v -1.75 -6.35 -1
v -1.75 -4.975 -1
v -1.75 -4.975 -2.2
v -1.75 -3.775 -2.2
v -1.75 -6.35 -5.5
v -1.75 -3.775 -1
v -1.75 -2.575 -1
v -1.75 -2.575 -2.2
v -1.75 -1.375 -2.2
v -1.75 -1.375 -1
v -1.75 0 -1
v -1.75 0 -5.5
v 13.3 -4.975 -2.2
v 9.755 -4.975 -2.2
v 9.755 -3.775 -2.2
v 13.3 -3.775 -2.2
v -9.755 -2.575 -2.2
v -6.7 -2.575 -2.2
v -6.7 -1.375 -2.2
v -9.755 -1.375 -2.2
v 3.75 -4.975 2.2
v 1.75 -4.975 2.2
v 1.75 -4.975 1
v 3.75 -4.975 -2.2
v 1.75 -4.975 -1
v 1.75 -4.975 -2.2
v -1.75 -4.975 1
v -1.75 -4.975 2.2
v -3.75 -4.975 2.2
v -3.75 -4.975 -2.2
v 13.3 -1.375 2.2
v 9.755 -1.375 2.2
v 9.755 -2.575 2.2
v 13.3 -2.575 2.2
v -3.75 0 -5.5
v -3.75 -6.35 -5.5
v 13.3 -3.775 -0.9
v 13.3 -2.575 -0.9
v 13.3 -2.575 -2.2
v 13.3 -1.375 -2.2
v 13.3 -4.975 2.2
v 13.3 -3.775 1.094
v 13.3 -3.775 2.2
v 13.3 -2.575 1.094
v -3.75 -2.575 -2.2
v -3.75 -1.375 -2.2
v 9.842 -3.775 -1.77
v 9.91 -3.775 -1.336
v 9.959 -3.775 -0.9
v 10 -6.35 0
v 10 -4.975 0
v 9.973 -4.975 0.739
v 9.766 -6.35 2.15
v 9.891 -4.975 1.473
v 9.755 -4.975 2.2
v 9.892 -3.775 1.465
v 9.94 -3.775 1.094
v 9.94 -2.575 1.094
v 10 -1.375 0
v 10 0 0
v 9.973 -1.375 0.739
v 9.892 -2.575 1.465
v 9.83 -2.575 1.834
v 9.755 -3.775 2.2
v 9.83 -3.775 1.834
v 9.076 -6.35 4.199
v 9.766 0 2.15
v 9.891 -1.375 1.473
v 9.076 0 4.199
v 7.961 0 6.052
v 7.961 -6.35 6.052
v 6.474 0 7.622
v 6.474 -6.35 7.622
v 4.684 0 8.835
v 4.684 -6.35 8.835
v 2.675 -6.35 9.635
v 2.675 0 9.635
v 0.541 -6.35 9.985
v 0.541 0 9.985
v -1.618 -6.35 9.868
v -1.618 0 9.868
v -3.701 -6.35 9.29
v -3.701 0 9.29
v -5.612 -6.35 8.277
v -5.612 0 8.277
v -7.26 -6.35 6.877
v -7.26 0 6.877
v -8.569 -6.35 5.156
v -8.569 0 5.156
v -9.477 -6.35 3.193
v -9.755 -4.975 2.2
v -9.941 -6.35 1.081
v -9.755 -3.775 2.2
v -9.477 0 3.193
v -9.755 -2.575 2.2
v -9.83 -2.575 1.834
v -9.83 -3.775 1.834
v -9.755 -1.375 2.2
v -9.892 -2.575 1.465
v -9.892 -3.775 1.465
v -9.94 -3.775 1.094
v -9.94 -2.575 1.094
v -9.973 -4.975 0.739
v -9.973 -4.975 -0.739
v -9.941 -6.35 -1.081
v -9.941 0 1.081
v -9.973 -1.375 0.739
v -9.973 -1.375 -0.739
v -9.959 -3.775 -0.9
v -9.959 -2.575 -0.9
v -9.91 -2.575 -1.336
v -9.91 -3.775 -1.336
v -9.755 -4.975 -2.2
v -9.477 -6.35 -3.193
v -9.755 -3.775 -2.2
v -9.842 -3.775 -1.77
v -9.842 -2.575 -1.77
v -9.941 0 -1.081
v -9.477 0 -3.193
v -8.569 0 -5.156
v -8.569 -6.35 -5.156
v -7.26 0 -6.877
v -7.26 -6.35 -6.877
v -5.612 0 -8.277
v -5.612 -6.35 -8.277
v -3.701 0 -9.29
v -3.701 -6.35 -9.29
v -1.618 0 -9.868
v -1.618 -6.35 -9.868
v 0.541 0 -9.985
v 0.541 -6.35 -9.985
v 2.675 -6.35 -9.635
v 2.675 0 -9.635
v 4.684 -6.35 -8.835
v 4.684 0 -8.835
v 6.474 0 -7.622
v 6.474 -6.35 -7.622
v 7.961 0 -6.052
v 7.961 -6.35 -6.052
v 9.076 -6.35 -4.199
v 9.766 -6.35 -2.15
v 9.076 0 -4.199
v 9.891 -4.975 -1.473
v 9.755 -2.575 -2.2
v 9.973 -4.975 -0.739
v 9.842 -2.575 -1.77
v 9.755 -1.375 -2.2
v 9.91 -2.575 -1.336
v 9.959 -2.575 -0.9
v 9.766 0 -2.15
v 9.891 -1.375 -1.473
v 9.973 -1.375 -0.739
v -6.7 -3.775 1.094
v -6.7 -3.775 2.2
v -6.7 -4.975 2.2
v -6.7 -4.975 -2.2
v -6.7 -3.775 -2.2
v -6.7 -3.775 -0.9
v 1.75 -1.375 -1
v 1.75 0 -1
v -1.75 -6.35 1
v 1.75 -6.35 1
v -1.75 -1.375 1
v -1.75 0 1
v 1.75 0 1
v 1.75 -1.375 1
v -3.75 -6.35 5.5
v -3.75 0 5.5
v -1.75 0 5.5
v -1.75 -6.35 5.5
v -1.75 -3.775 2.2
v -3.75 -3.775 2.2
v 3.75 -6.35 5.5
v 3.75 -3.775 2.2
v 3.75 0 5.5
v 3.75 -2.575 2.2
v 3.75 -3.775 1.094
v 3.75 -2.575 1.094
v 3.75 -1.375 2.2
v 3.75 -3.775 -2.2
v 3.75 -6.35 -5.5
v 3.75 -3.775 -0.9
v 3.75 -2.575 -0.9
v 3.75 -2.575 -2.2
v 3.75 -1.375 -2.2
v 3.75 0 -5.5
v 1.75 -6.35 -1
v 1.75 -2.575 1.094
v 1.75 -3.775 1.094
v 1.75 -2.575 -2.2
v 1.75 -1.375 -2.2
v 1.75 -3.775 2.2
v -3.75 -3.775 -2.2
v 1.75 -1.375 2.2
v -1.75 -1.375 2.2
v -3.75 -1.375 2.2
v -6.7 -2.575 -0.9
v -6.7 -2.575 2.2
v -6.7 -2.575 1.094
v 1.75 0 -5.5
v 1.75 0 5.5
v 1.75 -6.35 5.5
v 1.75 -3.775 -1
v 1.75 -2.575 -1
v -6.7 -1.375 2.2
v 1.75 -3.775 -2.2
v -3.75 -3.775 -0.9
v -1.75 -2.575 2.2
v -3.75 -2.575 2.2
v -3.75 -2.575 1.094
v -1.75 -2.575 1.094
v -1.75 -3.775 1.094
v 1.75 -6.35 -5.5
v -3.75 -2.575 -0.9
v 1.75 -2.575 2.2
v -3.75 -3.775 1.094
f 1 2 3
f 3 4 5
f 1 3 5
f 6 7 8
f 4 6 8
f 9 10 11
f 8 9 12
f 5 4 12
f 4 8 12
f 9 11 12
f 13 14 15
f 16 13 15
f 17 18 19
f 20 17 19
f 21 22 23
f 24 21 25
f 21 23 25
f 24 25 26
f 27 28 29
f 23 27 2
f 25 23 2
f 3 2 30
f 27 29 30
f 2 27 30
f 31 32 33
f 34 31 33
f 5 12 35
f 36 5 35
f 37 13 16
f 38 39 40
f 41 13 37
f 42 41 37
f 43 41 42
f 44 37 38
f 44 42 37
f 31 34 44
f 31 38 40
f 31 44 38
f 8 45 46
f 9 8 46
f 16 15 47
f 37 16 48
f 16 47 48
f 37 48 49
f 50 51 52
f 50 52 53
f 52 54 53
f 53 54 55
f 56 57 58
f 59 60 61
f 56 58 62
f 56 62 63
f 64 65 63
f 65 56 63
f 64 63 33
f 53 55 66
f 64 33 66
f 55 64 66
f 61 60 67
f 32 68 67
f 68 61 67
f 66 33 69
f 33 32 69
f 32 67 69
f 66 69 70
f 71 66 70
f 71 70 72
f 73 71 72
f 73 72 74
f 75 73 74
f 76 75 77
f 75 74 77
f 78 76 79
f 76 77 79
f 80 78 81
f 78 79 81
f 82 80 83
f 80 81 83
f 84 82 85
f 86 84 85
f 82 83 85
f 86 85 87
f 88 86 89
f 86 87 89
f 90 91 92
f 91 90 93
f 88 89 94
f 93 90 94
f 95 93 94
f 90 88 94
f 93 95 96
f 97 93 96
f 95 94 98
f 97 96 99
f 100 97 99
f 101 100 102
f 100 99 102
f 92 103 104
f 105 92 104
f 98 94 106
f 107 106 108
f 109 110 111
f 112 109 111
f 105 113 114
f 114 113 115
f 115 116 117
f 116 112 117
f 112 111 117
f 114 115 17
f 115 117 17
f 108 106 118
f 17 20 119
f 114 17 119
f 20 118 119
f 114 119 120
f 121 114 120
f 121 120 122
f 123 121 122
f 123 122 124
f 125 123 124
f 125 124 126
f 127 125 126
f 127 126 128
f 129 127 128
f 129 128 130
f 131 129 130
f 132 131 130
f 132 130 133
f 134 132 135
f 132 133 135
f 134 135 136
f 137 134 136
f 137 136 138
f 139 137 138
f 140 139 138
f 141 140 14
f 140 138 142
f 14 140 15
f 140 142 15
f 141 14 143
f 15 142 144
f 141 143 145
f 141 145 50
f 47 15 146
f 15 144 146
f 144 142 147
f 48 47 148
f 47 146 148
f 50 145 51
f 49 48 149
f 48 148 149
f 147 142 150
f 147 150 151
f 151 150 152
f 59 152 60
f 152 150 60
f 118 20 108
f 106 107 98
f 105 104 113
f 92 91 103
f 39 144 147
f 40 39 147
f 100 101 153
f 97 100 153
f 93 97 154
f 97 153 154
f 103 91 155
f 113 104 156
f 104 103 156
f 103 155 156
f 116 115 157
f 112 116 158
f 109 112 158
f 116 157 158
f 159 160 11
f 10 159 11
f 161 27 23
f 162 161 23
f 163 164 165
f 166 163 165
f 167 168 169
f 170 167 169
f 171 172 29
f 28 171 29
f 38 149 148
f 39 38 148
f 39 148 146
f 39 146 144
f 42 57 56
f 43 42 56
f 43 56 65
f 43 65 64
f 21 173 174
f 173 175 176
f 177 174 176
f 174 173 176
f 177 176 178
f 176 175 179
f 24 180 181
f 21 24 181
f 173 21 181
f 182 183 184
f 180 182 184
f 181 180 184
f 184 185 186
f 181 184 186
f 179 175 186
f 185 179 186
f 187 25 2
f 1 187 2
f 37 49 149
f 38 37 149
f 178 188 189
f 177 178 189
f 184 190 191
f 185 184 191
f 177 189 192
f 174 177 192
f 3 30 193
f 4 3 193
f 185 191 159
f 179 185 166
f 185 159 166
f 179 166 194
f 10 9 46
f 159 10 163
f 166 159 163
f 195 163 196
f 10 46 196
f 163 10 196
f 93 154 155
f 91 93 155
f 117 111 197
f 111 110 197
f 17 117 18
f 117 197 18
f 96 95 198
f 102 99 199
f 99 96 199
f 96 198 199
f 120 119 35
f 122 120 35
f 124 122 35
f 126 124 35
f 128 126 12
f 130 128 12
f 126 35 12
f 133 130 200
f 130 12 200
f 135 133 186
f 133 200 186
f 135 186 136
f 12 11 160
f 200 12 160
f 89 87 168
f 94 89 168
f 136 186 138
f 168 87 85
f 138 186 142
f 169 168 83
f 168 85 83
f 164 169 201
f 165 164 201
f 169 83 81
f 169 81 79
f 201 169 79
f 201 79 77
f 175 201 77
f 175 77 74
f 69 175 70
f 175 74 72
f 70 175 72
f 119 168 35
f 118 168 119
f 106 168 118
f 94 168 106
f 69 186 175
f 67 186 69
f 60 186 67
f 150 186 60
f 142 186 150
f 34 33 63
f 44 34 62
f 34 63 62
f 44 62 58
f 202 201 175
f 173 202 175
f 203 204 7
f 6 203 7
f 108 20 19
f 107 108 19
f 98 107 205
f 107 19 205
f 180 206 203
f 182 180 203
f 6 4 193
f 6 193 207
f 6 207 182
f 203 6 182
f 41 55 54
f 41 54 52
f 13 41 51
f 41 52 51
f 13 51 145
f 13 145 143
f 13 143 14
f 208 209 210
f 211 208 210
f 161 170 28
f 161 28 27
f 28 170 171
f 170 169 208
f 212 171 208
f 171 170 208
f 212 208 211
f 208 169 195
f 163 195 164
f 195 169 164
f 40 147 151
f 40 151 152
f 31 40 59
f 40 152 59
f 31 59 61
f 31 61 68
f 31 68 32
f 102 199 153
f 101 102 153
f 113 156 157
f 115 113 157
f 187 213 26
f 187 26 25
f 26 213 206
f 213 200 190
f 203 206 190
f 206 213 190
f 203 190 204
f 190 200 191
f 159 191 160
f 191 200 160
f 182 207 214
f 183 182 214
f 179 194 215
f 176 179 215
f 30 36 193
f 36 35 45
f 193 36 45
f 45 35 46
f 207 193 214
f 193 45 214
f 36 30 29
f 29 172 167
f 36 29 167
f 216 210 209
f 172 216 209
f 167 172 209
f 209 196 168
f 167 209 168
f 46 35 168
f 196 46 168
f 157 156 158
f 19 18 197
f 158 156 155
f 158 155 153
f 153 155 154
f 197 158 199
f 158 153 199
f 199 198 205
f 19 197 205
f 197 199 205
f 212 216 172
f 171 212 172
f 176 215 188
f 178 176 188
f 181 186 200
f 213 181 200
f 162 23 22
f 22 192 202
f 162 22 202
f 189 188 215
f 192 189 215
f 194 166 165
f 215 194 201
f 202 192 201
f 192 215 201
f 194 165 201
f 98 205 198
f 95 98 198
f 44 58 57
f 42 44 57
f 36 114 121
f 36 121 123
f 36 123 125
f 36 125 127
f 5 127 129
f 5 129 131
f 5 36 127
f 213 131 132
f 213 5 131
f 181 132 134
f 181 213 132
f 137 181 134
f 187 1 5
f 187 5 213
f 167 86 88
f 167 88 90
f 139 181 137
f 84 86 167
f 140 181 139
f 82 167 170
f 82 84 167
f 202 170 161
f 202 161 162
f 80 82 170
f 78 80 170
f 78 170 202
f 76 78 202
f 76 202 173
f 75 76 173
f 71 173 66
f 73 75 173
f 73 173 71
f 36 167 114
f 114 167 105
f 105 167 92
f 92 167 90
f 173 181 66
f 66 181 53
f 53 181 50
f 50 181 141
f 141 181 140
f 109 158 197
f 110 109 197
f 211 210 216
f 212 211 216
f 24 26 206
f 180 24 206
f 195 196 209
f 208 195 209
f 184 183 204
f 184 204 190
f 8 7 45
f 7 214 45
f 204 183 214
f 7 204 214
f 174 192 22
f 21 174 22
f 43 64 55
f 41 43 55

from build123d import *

# Parameters (mm, degrees)
F0_R     = 10
F1_DEPTH = 6.35
F4_DEPTH = 23
F5_DEPTH = 3
F6_DEPTH = 25


# Not quite as in the source:
# - a feature names something its author has since deleted; it is built from what else it names


with BuildPart() as f1:
    # F0 (on Front) → F1 (new body)
    with BuildSketch(Plane.XZ):
        Circle(F0_R)
        Polygon((-3.75, -5.5), (-3.75, -1), (-3.75, 1), (-3.75, 5.5), (-1.75, 5.5), (-1.75, 1), (1.75, 1), (1.75, 5.5), (3.75, 5.5), (3.75, 1), (3.75, -1), (3.75, -5.5), (1.75, -5.5), (1.75, -1), (-1.75, -1), (-1.75, -5.5), align=None, mode=Mode.SUBTRACT)
    extrude(amount=F1_DEPTH)

    # F3 (on offset) → F4 (join)
    with BuildSketch(Plane.YZ.offset(-9.7)):
        Polygon((-1.375, -2.2), (-1.375, 0), (-1.375, 2.2), (-2.575, 2.2), (-2.575, 1.0935393064), (-3.775, 1.0935393064), (-3.775, 2.2), (-4.975, 2.2), (-4.975, -2.2), (-3.775, -2.2), (-3.775, -0.9002136735), (-2.575, -0.9002136735), (-2.575, -2.2), align=None)
    extrude(amount=F4_DEPTH)

    # F3 (on offset) → F5 (cut)
    with BuildSketch(Plane.YZ.offset(-9.7)):
        Polygon((-1.375, -2.2), (-1.375, 0), (-1.375, 2.2), (-2.575, 2.2), (-2.575, 1.0935393064), (-3.775, 1.0935393064), (-3.775, 2.2), (-4.975, 2.2), (-4.975, -2.2), (-3.775, -2.2), (-3.775, -0.9002136735), (-2.575, -0.9002136735), (-2.575, -2.2), align=None)
    extrude(amount=F5_DEPTH, mode=Mode.SUBTRACT)

    # F3 (on offset) → F6 (cut)
    with BuildSketch(Plane.YZ.offset(-9.7)):
        Polygon((-1.375, -2.2), (-1.375, 0), (-1.375, 2.2), (-2.575, 2.2), (-2.575, 1.0935393064), (-3.775, 1.0935393064), (-3.775, 2.2), (-4.975, 2.2), (-4.975, -2.2), (-3.775, -2.2), (-3.775, -0.9002136735), (-2.575, -0.9002136735), (-2.575, -2.2), align=None)
    extrude(amount=-F6_DEPTH, mode=Mode.SUBTRACT)


solid = f1.part
